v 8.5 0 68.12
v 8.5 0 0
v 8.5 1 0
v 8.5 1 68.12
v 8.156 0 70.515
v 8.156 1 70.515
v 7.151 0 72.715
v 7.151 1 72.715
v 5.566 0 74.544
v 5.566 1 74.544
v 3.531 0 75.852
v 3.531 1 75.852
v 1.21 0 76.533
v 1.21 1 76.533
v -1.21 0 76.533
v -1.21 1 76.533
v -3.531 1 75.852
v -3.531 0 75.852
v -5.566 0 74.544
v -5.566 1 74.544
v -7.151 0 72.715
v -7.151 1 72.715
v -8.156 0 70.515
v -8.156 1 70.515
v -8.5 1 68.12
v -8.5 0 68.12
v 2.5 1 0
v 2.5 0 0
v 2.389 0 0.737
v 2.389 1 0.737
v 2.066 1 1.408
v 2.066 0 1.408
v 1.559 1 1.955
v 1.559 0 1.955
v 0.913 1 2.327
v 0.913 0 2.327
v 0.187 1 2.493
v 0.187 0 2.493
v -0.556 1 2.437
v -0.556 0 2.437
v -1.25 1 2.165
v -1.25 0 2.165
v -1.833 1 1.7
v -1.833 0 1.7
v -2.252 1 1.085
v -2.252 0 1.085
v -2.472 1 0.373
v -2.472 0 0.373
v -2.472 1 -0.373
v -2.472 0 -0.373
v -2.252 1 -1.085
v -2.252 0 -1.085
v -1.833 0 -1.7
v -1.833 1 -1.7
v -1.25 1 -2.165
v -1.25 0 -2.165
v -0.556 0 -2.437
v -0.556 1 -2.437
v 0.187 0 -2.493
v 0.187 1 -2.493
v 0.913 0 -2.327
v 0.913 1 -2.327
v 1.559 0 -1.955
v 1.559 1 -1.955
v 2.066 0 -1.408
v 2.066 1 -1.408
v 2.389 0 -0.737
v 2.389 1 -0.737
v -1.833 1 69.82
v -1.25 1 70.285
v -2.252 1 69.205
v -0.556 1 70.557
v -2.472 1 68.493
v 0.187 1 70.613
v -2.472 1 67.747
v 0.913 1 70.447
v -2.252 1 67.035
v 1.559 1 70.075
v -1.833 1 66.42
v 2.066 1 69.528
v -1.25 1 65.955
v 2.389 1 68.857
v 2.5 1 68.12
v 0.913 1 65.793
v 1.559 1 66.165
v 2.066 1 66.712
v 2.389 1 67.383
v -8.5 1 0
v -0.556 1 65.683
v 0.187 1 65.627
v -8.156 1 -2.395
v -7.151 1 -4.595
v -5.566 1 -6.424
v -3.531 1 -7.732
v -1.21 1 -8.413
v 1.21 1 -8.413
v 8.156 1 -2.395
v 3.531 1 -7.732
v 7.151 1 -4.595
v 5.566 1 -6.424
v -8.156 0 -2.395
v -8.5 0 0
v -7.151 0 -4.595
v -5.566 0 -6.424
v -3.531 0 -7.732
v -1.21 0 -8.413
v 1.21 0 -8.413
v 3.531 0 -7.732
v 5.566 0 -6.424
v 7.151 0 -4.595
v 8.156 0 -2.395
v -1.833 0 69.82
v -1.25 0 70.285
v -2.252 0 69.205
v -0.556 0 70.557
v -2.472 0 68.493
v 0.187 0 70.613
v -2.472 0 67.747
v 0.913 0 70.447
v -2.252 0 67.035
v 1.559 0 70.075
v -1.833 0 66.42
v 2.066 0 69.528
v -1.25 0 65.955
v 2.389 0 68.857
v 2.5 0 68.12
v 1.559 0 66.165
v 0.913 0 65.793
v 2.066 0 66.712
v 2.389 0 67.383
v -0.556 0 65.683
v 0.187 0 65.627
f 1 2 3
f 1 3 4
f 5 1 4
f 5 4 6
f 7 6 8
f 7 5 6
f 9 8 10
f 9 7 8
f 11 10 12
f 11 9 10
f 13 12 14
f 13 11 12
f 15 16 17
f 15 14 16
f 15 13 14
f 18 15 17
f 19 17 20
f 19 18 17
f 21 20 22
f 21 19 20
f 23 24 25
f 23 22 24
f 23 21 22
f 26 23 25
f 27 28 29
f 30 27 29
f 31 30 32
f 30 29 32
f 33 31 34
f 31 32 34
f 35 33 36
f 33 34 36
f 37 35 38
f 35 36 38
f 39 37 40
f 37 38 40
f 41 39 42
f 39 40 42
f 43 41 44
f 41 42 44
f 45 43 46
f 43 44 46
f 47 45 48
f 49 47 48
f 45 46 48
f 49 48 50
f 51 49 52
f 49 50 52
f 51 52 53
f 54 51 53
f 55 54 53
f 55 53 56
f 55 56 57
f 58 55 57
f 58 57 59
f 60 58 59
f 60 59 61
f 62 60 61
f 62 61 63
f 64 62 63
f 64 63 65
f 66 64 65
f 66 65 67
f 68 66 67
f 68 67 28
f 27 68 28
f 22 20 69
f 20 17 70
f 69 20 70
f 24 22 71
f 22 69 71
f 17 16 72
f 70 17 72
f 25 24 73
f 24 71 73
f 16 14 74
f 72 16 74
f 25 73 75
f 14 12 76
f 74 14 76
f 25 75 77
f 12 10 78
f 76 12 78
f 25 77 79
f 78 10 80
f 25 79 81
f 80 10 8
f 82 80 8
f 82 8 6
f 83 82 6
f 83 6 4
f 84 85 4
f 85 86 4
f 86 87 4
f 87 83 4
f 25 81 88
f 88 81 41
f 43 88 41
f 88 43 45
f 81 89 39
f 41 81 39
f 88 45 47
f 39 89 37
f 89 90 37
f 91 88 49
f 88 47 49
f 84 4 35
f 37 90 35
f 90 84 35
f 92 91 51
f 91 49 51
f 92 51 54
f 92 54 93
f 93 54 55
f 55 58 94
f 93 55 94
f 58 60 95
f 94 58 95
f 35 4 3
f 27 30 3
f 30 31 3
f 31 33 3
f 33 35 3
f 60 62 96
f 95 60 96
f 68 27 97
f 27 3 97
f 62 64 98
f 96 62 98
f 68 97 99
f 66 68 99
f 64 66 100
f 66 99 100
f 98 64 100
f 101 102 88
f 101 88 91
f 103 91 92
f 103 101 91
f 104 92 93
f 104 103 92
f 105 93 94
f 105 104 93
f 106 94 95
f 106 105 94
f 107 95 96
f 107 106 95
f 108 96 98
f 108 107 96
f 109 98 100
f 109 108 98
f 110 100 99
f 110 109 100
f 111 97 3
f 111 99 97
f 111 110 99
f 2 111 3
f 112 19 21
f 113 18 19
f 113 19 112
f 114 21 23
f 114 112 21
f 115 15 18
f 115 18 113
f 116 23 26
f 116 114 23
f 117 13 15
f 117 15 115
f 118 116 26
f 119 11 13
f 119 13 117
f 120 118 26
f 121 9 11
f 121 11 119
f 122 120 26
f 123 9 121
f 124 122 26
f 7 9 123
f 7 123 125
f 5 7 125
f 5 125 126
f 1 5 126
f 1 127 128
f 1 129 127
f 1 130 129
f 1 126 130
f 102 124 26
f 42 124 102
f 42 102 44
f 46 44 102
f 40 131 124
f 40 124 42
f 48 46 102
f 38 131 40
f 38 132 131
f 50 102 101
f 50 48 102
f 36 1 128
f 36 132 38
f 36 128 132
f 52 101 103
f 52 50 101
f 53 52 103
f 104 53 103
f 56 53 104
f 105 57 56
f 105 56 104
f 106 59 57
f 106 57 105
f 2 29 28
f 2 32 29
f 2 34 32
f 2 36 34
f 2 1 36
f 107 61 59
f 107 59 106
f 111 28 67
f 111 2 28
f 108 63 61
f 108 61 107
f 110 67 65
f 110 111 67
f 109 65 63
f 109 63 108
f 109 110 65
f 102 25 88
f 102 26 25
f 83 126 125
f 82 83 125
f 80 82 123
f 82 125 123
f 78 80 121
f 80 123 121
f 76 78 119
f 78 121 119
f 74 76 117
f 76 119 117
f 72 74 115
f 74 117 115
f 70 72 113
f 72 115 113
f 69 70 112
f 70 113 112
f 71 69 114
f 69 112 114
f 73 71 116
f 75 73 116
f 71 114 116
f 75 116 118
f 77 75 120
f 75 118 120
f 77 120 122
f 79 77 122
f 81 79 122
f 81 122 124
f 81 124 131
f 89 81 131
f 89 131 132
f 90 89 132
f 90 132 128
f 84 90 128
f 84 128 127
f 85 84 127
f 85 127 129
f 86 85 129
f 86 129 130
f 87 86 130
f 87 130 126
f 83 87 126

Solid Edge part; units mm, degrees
sketch "Sketch1" plane through (0, 0, 0) normal (0, -1, 0) x (1, 0, 0)
  line L0 (8.5, 0) -> (8.5, 68.12)
  line L1 (-8.5, 68.12) -> (-8.5, 0)
  arc A0 (-8.5, 68.12) -> (8.5, 68.12) centre (0, 68.12) cw
  arc A1 (8.5, 0) -> (-8.5, 0) centre (0, 0) cw
extrude "Protrusion1" add sketch "Sketch1" against normal blind 1
sketch "Sketch2" plane through (0, 0, 0) normal (0, -1, 0) x (1, 0, 0)
  circle A0 centre (0, 68.12) radius 2.5
extrude "ExtrudedCutout_1" cut sketch "Sketch2" against normal blind 5
sketch "Sketch3" plane through (0, 0, 0) normal (0, -1, 0) x (1, 0, 0)
  circle A0 centre (0, 0) radius 2.5
extrude "ExtrudedCutout_2" cut sketch "Sketch3" against normal blind 5
